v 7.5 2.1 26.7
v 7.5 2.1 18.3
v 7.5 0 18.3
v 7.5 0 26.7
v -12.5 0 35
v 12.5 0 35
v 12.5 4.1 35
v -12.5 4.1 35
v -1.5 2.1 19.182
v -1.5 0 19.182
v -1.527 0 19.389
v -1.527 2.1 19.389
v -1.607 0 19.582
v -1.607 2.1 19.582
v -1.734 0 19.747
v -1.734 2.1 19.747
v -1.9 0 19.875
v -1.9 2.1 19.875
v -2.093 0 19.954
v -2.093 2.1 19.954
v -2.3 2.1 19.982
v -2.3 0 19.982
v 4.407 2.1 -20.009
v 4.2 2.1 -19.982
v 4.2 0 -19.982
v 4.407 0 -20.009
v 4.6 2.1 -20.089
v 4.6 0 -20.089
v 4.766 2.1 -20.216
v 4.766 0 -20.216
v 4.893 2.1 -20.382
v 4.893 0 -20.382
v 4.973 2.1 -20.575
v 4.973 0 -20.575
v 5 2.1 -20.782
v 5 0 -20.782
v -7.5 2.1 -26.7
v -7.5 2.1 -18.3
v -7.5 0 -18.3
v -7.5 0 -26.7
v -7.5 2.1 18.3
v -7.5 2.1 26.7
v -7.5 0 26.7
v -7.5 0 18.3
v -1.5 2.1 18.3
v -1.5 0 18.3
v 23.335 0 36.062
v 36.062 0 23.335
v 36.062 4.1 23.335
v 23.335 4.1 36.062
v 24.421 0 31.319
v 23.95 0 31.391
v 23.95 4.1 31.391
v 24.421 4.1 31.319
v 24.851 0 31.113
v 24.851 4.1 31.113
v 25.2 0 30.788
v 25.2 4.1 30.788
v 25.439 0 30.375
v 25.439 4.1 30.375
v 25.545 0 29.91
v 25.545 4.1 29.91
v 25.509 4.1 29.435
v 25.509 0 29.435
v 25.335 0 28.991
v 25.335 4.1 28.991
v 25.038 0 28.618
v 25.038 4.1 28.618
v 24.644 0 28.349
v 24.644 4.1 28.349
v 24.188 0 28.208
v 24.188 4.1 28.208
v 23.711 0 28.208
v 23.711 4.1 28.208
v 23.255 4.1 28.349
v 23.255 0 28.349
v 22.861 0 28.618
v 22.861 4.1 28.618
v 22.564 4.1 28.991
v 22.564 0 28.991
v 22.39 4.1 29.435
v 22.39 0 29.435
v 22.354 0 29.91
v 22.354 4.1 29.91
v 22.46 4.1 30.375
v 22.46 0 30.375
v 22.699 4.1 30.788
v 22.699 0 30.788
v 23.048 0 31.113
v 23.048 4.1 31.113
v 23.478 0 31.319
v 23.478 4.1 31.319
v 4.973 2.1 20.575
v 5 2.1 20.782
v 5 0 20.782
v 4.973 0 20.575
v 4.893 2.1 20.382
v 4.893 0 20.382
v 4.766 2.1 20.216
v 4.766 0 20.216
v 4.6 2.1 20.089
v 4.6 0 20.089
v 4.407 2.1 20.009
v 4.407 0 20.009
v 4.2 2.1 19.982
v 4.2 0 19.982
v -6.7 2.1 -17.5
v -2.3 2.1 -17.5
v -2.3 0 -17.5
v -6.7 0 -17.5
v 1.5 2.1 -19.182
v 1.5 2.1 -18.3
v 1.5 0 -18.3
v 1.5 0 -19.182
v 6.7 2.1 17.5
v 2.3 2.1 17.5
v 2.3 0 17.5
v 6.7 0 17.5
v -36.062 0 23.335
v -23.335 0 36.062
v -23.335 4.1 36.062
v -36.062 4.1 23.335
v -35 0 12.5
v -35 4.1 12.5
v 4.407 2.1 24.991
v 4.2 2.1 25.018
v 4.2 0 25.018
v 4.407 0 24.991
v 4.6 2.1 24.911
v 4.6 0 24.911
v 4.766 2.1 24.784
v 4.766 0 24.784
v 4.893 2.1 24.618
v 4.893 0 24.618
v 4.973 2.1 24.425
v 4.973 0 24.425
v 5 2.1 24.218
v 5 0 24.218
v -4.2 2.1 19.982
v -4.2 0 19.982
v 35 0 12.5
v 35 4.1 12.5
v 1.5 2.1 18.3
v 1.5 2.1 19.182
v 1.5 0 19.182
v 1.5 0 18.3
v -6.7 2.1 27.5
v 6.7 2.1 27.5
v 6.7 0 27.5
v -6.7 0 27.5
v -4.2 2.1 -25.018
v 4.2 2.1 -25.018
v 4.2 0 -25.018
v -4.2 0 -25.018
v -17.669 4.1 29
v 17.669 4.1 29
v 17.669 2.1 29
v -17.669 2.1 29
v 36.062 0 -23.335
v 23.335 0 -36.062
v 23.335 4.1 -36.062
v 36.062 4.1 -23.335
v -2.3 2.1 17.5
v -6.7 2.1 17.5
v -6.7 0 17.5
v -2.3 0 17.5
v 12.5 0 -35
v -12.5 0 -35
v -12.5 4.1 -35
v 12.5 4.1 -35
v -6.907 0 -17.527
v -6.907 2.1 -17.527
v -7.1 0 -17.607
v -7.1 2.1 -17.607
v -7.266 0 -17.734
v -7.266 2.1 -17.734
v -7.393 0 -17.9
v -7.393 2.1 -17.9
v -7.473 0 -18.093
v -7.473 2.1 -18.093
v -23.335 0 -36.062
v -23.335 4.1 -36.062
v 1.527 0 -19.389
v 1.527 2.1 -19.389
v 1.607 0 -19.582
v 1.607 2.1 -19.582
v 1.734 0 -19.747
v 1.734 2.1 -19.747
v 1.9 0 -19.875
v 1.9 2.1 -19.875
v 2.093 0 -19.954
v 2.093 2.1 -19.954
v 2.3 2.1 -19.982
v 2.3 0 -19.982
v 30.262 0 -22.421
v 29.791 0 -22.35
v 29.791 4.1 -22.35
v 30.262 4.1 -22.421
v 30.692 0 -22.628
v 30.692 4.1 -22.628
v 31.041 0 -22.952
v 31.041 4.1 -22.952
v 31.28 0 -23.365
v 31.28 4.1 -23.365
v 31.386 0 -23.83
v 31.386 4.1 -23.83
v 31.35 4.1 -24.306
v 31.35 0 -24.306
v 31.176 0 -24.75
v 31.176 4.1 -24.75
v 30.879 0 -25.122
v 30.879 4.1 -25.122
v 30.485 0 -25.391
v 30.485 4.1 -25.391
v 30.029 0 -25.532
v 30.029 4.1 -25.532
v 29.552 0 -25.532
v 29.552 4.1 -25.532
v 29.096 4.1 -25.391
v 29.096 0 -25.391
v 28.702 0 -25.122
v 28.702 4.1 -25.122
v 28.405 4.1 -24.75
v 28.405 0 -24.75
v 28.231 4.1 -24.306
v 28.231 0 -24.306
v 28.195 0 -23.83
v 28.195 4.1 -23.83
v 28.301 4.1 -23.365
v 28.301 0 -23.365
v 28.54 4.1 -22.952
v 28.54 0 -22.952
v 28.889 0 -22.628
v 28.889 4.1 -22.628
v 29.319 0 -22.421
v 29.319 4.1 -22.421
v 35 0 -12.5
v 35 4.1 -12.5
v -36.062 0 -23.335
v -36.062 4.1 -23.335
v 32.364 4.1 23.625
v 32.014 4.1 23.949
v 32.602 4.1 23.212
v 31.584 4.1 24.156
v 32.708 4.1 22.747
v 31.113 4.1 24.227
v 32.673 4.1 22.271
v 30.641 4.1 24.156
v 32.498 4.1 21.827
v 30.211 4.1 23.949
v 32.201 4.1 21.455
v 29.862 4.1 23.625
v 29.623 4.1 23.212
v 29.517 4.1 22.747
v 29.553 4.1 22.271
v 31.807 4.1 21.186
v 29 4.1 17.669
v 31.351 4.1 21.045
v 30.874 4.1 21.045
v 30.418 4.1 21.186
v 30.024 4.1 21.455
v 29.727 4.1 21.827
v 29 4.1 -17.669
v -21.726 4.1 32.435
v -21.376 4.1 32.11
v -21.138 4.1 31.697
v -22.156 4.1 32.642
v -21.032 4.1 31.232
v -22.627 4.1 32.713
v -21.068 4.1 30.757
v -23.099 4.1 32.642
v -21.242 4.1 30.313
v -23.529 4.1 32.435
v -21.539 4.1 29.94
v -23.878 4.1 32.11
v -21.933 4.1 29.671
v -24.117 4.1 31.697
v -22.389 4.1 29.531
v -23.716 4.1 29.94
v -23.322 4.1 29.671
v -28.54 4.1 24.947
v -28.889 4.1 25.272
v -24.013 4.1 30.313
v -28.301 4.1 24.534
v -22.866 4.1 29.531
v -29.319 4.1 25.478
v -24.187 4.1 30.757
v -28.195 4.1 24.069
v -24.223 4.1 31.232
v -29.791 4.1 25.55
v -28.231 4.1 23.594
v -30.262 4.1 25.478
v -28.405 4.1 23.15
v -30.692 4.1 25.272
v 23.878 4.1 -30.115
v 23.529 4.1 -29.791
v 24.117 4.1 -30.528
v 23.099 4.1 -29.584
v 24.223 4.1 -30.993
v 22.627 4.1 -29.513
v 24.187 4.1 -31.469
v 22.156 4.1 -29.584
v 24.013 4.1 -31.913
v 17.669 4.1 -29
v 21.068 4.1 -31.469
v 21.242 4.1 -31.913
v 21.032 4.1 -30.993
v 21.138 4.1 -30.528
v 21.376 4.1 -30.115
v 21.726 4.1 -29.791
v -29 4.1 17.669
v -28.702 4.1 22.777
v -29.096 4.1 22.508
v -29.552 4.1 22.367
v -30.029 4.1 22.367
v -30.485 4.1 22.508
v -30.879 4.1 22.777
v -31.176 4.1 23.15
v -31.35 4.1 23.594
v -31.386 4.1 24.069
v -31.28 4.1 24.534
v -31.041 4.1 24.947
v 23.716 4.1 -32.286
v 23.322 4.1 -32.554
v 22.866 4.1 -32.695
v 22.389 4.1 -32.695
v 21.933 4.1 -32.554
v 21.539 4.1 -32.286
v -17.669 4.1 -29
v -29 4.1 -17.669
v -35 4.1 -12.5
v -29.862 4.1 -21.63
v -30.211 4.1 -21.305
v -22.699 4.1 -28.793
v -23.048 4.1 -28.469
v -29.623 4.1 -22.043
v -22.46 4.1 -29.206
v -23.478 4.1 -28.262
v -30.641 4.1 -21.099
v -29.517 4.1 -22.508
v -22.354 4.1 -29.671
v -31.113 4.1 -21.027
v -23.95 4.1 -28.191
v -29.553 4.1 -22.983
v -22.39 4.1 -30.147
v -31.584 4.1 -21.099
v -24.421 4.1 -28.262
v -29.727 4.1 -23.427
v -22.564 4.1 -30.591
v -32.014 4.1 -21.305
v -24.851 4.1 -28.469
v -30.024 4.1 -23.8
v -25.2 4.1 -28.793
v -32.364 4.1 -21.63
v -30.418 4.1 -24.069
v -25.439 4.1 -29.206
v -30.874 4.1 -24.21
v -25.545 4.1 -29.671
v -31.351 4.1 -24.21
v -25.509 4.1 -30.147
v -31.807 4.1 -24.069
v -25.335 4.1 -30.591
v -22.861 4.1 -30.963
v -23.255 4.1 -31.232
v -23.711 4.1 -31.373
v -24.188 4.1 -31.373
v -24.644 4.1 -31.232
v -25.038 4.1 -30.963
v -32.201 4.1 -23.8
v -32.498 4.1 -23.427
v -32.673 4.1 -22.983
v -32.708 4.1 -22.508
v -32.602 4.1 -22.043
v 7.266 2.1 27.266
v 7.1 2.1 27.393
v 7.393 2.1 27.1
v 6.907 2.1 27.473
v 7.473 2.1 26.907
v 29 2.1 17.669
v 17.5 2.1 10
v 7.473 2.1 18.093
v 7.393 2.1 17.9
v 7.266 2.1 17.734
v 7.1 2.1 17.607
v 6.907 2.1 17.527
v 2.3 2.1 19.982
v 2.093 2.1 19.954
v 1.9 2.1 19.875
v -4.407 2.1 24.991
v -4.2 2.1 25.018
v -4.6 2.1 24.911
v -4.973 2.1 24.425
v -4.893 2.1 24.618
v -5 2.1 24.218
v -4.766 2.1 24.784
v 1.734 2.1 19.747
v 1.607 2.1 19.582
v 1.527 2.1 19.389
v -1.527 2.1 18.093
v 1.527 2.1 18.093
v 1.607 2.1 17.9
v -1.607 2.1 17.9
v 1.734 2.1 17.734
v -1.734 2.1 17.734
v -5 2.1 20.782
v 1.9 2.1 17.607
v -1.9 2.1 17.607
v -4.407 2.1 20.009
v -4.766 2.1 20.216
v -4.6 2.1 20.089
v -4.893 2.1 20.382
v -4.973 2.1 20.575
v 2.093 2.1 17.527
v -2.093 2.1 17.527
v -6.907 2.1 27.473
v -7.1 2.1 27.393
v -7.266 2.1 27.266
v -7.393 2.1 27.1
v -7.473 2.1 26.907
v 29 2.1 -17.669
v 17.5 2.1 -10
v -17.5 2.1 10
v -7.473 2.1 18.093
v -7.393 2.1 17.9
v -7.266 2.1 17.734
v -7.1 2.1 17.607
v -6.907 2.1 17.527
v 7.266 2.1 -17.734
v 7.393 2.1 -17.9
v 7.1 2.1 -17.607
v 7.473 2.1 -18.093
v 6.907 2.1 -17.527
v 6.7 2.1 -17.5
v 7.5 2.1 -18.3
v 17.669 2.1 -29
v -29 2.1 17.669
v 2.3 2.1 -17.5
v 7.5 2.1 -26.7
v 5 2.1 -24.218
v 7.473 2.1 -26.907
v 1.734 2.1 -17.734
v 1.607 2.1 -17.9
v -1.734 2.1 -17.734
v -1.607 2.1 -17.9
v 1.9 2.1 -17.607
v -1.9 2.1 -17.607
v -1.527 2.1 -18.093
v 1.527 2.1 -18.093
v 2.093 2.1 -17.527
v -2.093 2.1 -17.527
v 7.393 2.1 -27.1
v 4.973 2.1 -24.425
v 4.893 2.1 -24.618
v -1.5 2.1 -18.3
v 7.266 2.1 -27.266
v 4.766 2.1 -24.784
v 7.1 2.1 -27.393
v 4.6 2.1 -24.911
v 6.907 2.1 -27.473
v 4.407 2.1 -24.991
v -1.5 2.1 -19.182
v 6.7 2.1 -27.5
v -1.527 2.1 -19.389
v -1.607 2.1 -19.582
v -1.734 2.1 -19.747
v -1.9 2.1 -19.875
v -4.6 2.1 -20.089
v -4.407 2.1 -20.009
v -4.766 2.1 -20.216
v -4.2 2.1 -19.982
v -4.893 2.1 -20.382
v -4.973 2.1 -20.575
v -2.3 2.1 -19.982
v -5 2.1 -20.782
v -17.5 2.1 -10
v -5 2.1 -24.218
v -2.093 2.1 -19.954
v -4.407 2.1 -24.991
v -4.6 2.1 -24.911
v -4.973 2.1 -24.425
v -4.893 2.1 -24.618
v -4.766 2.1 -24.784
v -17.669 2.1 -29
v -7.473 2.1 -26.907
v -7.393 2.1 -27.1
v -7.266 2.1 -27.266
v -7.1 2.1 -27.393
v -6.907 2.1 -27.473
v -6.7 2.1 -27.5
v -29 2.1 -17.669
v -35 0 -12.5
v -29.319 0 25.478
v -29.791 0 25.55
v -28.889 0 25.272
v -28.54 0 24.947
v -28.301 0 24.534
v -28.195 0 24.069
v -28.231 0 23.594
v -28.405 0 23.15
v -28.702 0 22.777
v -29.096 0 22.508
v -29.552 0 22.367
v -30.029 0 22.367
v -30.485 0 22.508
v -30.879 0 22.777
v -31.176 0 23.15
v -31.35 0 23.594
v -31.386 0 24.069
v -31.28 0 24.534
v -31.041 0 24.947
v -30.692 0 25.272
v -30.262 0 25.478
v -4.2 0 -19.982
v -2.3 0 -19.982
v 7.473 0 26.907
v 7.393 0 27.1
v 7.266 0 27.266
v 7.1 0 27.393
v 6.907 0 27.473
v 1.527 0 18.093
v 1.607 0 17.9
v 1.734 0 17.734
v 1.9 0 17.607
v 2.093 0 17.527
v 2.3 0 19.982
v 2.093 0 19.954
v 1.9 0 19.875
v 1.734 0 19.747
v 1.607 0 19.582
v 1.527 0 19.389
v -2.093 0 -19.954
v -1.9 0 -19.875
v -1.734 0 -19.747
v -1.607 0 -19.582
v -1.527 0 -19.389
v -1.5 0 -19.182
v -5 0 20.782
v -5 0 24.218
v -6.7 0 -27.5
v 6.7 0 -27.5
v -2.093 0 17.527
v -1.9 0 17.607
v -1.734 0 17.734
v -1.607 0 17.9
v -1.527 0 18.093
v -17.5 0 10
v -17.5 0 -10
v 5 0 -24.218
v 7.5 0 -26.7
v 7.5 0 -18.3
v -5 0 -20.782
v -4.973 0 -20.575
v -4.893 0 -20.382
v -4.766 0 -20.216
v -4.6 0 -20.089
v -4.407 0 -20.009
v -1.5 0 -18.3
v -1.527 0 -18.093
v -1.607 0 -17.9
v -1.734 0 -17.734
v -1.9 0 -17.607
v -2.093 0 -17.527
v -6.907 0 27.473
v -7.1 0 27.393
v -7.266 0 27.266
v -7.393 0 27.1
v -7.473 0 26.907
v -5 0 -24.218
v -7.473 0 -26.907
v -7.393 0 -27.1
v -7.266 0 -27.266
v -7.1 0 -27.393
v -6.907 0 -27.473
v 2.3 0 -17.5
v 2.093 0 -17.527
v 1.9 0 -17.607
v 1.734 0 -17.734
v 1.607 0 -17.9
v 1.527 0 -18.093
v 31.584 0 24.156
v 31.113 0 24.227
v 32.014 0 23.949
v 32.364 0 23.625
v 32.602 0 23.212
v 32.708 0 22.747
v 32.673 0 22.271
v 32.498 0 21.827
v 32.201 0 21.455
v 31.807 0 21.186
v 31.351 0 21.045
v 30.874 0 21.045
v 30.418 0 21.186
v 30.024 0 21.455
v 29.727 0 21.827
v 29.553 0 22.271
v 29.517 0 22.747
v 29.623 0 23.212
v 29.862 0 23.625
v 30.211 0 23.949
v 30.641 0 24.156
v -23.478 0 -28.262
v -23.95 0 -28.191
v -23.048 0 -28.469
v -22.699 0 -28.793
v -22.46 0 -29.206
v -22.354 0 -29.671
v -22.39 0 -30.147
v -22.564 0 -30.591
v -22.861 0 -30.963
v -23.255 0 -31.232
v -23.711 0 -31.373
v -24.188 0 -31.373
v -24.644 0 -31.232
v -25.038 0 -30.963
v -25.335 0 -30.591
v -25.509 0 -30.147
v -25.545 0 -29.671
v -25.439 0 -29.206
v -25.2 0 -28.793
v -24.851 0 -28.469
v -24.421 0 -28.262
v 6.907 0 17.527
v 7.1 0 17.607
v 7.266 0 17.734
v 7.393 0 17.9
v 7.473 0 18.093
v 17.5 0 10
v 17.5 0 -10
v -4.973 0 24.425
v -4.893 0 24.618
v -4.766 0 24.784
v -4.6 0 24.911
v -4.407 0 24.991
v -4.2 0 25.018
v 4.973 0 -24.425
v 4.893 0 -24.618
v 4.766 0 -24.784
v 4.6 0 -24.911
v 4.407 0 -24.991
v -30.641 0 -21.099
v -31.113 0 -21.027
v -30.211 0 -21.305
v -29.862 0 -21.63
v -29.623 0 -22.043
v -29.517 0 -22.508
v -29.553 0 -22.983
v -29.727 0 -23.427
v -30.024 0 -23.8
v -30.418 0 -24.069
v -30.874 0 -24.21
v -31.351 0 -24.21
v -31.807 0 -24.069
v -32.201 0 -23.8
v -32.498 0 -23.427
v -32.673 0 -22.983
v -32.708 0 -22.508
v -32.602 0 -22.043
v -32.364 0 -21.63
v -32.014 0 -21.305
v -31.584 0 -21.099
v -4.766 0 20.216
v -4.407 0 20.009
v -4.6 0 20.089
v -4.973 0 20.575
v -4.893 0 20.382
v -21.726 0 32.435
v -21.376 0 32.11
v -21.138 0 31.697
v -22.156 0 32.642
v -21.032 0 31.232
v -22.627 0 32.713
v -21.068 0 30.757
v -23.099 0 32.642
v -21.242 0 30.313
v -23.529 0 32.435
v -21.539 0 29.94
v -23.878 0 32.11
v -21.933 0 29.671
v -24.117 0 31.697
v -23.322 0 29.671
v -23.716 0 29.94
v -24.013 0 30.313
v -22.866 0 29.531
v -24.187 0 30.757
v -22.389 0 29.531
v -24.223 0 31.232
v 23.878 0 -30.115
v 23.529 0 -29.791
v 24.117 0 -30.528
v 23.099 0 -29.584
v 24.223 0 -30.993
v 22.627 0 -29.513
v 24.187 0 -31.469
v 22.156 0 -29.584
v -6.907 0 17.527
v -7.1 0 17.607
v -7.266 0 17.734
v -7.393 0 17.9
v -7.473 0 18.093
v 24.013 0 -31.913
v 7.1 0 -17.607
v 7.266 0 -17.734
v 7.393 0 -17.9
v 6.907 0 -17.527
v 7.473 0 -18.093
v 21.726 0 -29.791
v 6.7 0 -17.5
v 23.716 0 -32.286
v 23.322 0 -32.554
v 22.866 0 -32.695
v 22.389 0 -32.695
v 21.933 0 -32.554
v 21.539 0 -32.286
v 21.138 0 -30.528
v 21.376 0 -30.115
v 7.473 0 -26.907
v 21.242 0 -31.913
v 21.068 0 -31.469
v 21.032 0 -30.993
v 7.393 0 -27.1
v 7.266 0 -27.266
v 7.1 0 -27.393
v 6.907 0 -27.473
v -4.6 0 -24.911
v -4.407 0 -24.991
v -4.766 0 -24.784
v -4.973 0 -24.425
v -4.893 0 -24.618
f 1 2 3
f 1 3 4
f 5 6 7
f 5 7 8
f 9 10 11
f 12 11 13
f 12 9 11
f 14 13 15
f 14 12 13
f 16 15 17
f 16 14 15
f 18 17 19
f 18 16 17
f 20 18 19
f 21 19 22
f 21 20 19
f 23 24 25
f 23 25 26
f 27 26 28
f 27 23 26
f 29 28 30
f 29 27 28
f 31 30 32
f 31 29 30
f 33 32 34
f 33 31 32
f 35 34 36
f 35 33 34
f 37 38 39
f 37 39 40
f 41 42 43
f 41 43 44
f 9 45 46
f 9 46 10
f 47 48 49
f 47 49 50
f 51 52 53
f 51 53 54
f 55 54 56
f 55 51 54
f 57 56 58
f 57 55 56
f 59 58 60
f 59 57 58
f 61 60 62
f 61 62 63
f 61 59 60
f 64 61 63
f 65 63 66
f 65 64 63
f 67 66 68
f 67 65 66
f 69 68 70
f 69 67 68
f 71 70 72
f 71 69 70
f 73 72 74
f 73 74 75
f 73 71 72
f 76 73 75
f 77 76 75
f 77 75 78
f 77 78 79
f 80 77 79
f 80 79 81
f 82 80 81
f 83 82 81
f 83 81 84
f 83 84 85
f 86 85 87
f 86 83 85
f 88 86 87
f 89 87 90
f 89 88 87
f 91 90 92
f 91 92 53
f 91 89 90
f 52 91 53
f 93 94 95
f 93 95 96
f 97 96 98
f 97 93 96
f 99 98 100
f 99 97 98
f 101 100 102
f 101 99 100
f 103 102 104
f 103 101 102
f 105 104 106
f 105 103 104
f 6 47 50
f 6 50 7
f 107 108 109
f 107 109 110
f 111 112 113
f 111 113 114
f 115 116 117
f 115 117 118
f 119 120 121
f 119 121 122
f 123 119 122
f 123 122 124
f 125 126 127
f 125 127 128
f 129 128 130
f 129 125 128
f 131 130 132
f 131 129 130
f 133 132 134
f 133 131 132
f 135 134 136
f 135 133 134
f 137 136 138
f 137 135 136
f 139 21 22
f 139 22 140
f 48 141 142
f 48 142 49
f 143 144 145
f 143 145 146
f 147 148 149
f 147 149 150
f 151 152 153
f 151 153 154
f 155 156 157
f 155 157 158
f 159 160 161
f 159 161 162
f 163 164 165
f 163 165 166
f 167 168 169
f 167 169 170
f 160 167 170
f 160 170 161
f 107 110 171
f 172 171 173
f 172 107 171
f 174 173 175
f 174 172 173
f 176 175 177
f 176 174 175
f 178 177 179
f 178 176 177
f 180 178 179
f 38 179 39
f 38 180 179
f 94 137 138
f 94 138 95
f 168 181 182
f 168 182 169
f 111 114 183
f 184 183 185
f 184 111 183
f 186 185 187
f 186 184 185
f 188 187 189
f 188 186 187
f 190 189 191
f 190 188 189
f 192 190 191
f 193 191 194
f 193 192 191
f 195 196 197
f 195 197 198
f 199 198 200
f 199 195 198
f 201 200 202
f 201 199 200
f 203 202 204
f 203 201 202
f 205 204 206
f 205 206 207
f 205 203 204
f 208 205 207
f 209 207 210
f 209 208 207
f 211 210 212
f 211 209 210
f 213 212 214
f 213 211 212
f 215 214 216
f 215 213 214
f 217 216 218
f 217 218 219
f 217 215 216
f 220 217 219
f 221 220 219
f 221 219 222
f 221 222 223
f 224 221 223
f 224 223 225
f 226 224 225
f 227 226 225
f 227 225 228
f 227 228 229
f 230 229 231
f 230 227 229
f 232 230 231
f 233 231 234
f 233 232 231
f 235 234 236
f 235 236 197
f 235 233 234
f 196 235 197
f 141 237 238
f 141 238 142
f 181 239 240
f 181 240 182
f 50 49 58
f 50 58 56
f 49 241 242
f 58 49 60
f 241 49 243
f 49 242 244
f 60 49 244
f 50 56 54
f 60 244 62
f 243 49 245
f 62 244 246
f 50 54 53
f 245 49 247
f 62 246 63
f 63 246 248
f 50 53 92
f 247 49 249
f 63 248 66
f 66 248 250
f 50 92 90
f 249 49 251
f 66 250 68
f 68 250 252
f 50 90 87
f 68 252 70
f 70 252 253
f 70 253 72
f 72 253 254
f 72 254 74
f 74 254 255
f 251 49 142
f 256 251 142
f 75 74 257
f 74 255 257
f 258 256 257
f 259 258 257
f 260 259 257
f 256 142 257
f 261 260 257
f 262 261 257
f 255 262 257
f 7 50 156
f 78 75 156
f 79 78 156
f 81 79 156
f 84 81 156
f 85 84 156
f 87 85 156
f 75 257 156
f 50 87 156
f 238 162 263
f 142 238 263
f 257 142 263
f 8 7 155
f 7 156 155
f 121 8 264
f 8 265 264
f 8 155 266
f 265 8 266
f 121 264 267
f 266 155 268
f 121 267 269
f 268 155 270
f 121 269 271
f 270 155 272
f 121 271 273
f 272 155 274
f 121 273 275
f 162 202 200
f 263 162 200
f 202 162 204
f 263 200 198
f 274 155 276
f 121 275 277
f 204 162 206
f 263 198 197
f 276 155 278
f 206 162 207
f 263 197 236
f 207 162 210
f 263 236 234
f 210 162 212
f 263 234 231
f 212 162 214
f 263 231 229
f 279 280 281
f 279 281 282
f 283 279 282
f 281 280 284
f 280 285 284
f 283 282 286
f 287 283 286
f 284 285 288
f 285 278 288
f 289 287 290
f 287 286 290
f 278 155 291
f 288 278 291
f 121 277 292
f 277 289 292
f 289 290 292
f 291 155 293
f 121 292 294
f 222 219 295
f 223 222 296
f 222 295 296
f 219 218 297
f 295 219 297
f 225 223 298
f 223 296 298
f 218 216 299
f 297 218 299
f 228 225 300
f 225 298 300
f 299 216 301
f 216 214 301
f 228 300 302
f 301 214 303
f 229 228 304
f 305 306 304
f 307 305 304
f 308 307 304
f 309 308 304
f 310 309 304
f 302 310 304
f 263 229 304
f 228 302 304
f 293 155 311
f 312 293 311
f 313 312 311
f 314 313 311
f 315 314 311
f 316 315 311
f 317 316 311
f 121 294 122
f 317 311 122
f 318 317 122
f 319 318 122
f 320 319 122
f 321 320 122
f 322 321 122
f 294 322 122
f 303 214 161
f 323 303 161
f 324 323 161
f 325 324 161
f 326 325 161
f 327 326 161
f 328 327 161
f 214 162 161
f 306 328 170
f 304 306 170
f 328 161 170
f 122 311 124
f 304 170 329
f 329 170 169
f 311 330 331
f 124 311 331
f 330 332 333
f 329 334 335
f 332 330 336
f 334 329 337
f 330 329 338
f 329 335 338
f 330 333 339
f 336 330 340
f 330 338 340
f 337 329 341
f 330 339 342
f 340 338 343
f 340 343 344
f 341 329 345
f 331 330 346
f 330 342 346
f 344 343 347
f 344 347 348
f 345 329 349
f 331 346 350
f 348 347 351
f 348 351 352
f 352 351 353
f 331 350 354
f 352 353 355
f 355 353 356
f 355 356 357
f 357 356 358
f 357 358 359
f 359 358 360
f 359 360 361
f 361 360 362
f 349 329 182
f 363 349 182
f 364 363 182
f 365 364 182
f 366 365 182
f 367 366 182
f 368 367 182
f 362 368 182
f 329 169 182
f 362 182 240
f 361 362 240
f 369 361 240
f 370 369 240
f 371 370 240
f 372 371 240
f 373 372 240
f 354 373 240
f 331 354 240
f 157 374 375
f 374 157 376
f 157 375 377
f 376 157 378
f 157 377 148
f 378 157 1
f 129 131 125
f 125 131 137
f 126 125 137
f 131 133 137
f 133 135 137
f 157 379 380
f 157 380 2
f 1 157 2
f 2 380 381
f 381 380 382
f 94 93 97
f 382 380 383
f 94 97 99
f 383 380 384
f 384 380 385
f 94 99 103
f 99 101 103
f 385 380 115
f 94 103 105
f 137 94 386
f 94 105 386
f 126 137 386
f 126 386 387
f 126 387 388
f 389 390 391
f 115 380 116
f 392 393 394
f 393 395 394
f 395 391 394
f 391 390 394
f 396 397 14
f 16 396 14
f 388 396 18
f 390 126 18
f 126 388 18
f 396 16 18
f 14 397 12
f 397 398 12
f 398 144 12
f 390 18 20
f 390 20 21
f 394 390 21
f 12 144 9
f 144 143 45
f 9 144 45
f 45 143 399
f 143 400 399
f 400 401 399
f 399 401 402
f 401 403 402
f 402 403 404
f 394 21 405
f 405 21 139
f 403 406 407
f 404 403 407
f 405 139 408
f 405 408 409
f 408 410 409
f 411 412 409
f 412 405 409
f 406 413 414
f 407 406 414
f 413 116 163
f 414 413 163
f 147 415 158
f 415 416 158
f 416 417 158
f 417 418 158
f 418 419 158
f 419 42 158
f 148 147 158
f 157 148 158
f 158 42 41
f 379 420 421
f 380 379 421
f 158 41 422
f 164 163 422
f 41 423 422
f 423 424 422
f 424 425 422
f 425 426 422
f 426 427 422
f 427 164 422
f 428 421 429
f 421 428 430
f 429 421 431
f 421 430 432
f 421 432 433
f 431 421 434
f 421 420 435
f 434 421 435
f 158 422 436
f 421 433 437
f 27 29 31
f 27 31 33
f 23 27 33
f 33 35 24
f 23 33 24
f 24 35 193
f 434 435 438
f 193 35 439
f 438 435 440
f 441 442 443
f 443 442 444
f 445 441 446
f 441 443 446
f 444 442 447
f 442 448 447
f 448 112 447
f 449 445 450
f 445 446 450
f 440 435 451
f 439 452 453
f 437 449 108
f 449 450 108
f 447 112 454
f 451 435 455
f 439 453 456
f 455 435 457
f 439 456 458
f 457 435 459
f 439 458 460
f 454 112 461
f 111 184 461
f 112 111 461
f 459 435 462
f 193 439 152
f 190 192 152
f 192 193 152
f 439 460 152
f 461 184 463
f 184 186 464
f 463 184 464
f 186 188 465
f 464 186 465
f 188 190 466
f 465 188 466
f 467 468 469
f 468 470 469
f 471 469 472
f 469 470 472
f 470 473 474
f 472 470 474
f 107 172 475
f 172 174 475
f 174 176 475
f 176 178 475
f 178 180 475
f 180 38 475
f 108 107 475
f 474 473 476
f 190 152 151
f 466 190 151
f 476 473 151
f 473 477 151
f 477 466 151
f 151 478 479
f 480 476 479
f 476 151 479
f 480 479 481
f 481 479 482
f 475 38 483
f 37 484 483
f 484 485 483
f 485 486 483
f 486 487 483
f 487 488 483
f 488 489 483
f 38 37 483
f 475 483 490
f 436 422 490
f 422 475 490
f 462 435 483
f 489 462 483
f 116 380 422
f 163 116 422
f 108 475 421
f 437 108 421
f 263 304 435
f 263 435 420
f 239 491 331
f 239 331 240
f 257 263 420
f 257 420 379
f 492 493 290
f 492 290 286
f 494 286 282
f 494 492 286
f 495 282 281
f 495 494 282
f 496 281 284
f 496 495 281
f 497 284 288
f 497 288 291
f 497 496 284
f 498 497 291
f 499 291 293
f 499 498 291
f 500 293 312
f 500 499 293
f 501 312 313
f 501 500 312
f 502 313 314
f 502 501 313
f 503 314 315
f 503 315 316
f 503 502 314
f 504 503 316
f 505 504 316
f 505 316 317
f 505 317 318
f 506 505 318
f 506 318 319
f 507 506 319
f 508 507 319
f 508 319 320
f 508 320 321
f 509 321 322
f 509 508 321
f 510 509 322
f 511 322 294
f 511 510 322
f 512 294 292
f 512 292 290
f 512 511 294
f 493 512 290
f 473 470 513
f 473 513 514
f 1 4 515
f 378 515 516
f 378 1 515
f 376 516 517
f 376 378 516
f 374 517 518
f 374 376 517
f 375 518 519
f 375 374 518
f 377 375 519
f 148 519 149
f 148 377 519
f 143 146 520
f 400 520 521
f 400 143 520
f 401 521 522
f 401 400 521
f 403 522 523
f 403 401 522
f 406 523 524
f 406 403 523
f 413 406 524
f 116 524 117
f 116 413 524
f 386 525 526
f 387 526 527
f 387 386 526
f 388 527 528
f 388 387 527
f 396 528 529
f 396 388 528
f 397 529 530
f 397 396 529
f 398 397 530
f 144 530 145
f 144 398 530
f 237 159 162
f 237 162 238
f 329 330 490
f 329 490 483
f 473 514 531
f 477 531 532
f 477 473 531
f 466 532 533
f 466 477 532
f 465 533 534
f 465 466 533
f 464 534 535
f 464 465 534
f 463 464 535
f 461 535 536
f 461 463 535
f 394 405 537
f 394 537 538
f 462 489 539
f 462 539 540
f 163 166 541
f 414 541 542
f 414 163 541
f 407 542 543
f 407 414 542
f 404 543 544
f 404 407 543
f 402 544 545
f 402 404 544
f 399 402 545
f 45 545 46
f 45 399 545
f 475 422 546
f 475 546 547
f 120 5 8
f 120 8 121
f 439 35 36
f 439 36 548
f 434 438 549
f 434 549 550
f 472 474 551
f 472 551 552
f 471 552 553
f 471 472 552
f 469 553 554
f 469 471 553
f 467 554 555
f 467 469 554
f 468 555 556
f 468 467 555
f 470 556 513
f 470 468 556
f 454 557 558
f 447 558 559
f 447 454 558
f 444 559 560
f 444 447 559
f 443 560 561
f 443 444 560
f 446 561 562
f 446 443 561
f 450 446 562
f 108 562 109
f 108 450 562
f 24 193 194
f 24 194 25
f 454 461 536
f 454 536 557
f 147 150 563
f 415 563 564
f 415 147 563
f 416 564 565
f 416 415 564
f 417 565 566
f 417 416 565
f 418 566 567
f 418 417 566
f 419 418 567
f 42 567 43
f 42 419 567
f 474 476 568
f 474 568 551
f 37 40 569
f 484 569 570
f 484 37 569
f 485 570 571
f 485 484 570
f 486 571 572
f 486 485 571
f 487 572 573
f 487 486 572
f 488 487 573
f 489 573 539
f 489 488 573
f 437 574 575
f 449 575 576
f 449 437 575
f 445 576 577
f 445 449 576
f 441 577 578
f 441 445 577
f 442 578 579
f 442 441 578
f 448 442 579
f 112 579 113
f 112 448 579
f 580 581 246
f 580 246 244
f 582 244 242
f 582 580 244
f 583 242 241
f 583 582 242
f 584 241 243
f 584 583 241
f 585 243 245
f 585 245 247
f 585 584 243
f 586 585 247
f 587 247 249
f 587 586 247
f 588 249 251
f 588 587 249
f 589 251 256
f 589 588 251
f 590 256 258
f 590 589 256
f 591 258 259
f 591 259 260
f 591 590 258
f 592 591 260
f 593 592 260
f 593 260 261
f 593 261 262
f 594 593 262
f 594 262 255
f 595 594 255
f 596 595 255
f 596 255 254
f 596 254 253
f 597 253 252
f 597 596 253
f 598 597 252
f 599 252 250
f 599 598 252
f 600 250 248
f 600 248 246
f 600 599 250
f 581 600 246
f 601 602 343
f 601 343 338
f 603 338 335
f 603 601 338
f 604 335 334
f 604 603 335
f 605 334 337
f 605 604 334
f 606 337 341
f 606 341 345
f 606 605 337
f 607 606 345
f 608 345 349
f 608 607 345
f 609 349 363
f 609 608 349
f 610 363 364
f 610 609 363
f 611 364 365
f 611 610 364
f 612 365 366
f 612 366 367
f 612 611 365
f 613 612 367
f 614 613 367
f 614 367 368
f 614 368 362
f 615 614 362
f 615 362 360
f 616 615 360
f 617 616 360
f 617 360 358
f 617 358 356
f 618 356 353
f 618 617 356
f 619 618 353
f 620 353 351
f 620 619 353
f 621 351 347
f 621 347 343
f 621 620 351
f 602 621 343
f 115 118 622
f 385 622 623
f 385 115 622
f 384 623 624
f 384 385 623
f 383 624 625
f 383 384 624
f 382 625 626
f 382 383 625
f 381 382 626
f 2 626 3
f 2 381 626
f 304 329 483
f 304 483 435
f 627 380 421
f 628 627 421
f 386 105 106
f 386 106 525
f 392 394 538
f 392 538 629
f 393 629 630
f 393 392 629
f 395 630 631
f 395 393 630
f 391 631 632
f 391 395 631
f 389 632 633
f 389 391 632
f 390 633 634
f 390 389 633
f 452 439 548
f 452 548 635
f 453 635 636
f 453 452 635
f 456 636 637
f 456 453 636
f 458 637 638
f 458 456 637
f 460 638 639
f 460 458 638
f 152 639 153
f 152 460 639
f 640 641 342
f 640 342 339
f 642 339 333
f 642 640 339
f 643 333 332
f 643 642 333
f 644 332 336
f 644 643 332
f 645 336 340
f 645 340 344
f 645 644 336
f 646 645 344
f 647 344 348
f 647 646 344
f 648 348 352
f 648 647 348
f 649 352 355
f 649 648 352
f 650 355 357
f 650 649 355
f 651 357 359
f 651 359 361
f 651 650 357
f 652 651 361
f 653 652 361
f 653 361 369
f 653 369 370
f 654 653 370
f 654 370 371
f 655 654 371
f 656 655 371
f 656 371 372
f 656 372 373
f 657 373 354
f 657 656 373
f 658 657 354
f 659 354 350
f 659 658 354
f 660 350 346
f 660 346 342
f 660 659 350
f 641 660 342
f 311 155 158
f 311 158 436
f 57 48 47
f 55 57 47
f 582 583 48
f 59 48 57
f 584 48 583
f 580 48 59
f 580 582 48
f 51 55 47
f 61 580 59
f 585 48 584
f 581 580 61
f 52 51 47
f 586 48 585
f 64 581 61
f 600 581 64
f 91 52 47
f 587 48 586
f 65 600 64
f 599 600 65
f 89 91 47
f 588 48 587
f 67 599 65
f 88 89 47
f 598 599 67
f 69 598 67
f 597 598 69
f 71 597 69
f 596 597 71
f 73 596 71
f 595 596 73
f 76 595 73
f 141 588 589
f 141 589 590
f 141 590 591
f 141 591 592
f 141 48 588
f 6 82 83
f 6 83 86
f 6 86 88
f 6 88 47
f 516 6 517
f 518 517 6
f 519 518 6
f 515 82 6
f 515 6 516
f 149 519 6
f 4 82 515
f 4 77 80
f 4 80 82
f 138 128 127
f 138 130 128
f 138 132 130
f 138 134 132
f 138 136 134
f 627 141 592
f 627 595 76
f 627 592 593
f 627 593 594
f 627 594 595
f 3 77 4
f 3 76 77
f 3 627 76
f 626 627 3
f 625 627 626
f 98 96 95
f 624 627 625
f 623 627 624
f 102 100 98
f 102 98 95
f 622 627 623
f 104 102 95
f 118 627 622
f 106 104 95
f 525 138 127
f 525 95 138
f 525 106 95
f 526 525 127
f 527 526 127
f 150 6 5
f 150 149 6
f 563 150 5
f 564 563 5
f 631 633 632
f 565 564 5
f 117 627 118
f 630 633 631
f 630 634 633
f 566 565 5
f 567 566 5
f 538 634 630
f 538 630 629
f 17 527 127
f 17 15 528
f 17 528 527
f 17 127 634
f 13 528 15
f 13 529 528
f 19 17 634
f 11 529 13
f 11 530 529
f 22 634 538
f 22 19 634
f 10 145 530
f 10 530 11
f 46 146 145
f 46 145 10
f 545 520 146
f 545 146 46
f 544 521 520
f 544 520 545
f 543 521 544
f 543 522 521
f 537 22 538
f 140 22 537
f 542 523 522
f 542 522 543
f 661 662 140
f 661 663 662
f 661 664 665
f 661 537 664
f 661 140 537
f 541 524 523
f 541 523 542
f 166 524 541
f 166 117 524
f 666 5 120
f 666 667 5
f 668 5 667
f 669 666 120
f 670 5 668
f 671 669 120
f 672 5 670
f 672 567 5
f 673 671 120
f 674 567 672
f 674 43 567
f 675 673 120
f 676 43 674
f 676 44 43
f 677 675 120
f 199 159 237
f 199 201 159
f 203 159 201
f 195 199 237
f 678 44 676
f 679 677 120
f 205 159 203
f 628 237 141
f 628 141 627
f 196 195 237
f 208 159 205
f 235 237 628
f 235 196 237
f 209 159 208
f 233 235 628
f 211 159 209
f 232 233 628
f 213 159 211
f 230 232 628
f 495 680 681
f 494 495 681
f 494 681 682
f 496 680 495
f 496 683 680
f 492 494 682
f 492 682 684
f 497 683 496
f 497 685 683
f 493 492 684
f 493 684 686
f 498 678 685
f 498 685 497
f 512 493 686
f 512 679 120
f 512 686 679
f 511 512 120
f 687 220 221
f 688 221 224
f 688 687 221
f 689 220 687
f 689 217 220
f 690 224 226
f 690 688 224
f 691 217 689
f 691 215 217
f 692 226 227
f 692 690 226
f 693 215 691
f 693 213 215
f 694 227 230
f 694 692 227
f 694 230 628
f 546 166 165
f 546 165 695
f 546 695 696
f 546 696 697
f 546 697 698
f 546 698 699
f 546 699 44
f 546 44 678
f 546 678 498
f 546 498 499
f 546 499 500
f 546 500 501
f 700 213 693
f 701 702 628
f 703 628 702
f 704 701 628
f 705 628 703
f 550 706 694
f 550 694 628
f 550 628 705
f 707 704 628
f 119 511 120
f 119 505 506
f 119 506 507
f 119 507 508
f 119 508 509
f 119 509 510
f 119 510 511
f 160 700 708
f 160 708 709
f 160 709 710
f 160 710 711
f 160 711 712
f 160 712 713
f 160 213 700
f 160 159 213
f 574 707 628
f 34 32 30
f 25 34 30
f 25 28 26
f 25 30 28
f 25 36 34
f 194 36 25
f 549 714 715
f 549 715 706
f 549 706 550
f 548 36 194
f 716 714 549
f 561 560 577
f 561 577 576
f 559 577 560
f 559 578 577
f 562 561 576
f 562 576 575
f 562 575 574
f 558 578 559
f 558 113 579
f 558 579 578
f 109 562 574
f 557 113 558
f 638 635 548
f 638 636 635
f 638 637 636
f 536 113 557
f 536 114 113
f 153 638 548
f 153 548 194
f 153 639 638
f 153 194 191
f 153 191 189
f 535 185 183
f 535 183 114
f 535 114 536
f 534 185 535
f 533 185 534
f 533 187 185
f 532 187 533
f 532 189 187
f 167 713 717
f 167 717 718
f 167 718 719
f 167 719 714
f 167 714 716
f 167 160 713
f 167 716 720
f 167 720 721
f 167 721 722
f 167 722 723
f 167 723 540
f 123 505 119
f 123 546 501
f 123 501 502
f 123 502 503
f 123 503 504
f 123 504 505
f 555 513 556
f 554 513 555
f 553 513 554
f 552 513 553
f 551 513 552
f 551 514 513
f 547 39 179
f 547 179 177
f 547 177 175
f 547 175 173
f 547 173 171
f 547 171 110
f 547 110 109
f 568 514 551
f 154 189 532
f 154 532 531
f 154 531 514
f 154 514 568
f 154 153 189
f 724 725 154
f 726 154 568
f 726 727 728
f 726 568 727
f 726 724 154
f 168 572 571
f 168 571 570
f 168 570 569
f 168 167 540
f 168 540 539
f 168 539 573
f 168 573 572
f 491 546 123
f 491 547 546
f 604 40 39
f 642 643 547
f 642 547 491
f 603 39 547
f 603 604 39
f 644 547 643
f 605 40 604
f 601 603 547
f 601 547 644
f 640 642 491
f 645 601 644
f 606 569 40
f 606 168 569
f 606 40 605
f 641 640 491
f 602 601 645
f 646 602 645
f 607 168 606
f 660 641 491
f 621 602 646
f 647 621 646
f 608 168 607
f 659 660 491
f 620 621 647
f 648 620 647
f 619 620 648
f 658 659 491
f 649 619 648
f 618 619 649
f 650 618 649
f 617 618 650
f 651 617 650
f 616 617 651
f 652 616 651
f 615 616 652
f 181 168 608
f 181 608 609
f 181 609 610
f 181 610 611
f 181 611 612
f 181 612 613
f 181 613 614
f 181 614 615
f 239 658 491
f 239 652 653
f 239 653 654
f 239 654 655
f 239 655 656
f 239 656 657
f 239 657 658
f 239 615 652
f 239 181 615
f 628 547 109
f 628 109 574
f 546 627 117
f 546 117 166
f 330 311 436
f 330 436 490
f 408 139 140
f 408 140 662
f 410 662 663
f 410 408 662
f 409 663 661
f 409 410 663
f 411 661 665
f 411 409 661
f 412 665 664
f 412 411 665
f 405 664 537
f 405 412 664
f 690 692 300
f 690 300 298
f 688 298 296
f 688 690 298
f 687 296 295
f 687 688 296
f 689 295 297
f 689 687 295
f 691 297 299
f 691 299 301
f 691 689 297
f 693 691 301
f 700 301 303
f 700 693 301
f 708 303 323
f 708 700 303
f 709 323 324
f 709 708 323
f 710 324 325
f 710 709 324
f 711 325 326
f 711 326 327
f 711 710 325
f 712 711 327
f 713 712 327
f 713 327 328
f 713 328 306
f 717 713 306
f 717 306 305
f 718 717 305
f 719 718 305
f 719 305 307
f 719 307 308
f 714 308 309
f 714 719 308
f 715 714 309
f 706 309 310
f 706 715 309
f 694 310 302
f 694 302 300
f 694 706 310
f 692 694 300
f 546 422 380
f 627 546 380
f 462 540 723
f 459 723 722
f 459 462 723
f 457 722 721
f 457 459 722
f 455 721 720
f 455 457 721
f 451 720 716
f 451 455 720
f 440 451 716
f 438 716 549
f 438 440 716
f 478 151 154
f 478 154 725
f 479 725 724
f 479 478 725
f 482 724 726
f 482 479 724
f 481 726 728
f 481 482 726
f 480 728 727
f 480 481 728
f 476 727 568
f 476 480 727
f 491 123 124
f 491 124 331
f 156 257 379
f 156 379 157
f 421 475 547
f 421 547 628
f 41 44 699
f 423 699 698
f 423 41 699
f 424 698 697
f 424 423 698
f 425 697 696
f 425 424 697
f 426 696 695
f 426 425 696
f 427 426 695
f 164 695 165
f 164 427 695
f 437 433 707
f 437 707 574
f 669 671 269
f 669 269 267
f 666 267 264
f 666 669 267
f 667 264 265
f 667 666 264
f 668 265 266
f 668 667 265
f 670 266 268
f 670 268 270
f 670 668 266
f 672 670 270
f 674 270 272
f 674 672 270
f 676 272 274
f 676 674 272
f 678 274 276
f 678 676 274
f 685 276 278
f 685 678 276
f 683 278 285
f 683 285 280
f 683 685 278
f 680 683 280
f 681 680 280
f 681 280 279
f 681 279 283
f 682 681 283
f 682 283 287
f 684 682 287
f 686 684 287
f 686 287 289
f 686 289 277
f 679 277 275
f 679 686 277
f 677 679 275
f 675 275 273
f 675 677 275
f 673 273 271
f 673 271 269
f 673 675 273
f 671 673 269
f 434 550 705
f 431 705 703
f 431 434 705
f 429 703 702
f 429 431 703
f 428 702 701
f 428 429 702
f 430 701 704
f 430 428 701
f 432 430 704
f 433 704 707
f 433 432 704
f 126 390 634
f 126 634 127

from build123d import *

# Parameters (mm, degrees)
SKETCH1_R           = 1.6
BOSS_EXTRUDE2_DEPTH = 4.1
CUT_EXTRUDE1_DEPTH  = 2
CUT_EXTRUDE4_DEPTH  = 52.043216983
SKETCH9_W           = 35
SKETCH9_H           = 20
CUT_EXTRUDE5_DEPTH  = 10


with BuildPart() as part:
    # Sketch1 → Boss-Extrude2 (new body)
    with BuildSketch(Plane(origin=(0, 0, 0), x_dir=(1, 0, 0), z_dir=(0, 1, 0))):
        Polygon((-12.5, 35), (12.5, 35), (23.334523779, 36.062445841), (36.062445841, 23.334523779), (35, 12.5), (35, -12.5), (36.062445841, -23.334523779), (23.334523779, -36.062445841), (12.5, -35), (-12.5, -35), (-23.334523779, -36.062445841), (-36.062445841, -23.334523779), (-35, -12.5), (-35, 12.5), (-36.062445841, 23.334523779), (-23.334523779, 36.062445841), align=None)
        with Locations((22.627416998, 31.112698372)):
            Circle(SKETCH1_R, mode=Mode.SUBTRACT)
        with Locations((29.79056362, 23.94955175)):
            Circle(SKETCH1_R, mode=Mode.SUBTRACT)
        with Locations((31.112698372, -22.627416998)):
            Circle(SKETCH1_R, mode=Mode.SUBTRACT)
        with Locations((23.94955175, -29.79056362)):
            Circle(SKETCH1_R, mode=Mode.SUBTRACT)
        with Locations((-22.627416998, -31.112698372)):
            Circle(SKETCH1_R, mode=Mode.SUBTRACT)
        with Locations((-29.79056362, -23.94955175)):
            Circle(SKETCH1_R, mode=Mode.SUBTRACT)
        with Locations((-31.112698372, 22.627416998)):
            Circle(SKETCH1_R, mode=Mode.SUBTRACT)
        with Locations((-23.94955175, 29.79056362)):
            Circle(SKETCH1_R, mode=Mode.SUBTRACT)
    extrude(amount=BOSS_EXTRUDE2_DEPTH)

    # Sketch2 → Cut-Extrude1 (cut)
    with BuildSketch(Plane(origin=(0, 4.1, 0), x_dir=(1, 0, 0), z_dir=(0, 1, 0))):
        Polygon((-17.669047558, 29), (17.669047558, 29), (29, 17.669047558), (29, -17.669047558), (17.669047558, -29), (-17.669047558, -29), (-29, -17.669047558), (-29, 17.669047558), align=None)
    extrude(amount=-CUT_EXTRUDE1_DEPTH, mode=Mode.SUBTRACT)

    # Sketch8 → Cut-Extrude4 (cut, through all)
    with BuildSketch(Plane(origin=(0, 2.1, 0), x_dir=(1, 0, 0), z_dir=(0, 1, 0))):
        with BuildLine():
            Line((-1.5, 19.18174342), (-1.5, 18.3))
            ThreePointArc((-1.5, 18.3), (-1.734314575, 17.734314575), (-2.3, 17.5))
            Line((-2.3, 17.5), (-6.7, 17.5))
            ThreePointArc((-6.7, 17.5), (-7.265685425, 17.734314575), (-7.5, 18.3))
            Line((-7.5, 18.3), (-7.5, 26.7))
            ThreePointArc((-7.5, 26.7), (-7.265685425, 27.265685425), (-6.7, 27.5))
            Line((-6.7, 27.5), (6.7, 27.5))
            ThreePointArc((6.7, 27.5), (7.265685425, 27.265685425), (7.5, 26.7))
            Line((7.5, 26.7), (7.5, 18.3))
            ThreePointArc((7.5, 18.3), (7.265685425, 17.734314575), (6.7, 17.5))
            Line((6.7, 17.5), (2.3, 17.5))
            ThreePointArc((2.3, 17.5), (1.734314575, 17.734314575), (1.5, 18.3))
            Line((1.5, 18.3), (1.5, 19.18174342))
            ThreePointArc((1.5, 19.18174342), (1.734314575, 19.747428845), (2.3, 19.98174342))
            Line((2.3, 19.98174342), (4.2, 19.98174342))
            ThreePointArc((4.2, 19.98174342), (4.765685425, 20.216057995), (5, 20.78174342))
            Line((5, 20.78174342), (5, 24.21825658))
            ThreePointArc((5, 24.21825658), (4.765685425, 24.783942005), (4.2, 25.01825658))
            Line((4.2, 25.01825658), (-4.2, 25.01825658))
            ThreePointArc((-4.2, 25.01825658), (-4.765685425, 24.783942005), (-5, 24.21825658))
            Line((-5, 24.21825658), (-5, 20.78174342))
            ThreePointArc((-5, 20.78174342), (-4.765685425, 20.216057995), (-4.2, 19.98174342))
            Line((-4.2, 19.98174342), (-2.3, 19.98174342))
            ThreePointArc((-2.3, 19.98174342), (-1.734314575, 19.747428845), (-1.5, 19.18174342))
        make_face()
        with BuildLine():
            Line((2.3, -17.5), (6.7, -17.5))
            ThreePointArc((6.7, -17.5), (7.265685425, -17.734314575), (7.5, -18.3))
            Line((7.5, -18.3), (7.5, -26.7))
            ThreePointArc((7.5, -26.7), (7.265685425, -27.265685425), (6.7, -27.5))
            Line((6.7, -27.5), (-6.7, -27.5))
            ThreePointArc((-6.7, -27.5), (-7.265685425, -27.265685425), (-7.5, -26.7))
            Line((-7.5, -26.7), (-7.5, -18.3))
            ThreePointArc((-7.5, -18.3), (-7.265685425, -17.734314575), (-6.7, -17.5))
            Line((-6.7, -17.5), (-2.3, -17.5))
            ThreePointArc((-2.3, -17.5), (-1.734314575, -17.734314575), (-1.5, -18.3))
            Line((-1.5, -18.3), (-1.5, -19.18174342))
            ThreePointArc((-1.5, -19.18174342), (-1.734314575, -19.747428845), (-2.3, -19.98174342))
            Line((-2.3, -19.98174342), (-4.2, -19.98174342))
            ThreePointArc((-4.2, -19.98174342), (-4.765685425, -20.216057995), (-5, -20.78174342))
            Line((-5, -20.78174342), (-5, -24.21825658))
            ThreePointArc((-5, -24.21825658), (-4.765685425, -24.783942005), (-4.2, -25.01825658))
            Line((-4.2, -25.01825658), (4.2, -25.01825658))
            ThreePointArc((4.2, -25.01825658), (4.765685425, -24.783942005), (5, -24.21825658))
            Line((5, -24.21825658), (5, -20.78174342))
            ThreePointArc((5, -20.78174342), (4.765685425, -20.216057995), (4.2, -19.98174342))
            Line((4.2, -19.98174342), (2.3, -19.98174342))
            ThreePointArc((2.3, -19.98174342), (1.734314575, -19.747428845), (1.5, -19.18174342))
            Line((1.5, -19.18174342), (1.5, -18.3))
            ThreePointArc((1.5, -18.3), (1.734314575, -17.734314575), (2.3, -17.5))
        make_face()
    extrude(amount=-CUT_EXTRUDE4_DEPTH, mode=Mode.SUBTRACT)

    # Sketch9 → Cut-Extrude5 (cut)
    with BuildSketch(Plane(origin=(0, 2.1, 0), x_dir=(1, 0, 0), z_dir=(0, 1, 0))):
        Rectangle(SKETCH9_W, SKETCH9_H)
    extrude(amount=-CUT_EXTRUDE5_DEPTH, mode=Mode.SUBTRACT)


solid = part.part
